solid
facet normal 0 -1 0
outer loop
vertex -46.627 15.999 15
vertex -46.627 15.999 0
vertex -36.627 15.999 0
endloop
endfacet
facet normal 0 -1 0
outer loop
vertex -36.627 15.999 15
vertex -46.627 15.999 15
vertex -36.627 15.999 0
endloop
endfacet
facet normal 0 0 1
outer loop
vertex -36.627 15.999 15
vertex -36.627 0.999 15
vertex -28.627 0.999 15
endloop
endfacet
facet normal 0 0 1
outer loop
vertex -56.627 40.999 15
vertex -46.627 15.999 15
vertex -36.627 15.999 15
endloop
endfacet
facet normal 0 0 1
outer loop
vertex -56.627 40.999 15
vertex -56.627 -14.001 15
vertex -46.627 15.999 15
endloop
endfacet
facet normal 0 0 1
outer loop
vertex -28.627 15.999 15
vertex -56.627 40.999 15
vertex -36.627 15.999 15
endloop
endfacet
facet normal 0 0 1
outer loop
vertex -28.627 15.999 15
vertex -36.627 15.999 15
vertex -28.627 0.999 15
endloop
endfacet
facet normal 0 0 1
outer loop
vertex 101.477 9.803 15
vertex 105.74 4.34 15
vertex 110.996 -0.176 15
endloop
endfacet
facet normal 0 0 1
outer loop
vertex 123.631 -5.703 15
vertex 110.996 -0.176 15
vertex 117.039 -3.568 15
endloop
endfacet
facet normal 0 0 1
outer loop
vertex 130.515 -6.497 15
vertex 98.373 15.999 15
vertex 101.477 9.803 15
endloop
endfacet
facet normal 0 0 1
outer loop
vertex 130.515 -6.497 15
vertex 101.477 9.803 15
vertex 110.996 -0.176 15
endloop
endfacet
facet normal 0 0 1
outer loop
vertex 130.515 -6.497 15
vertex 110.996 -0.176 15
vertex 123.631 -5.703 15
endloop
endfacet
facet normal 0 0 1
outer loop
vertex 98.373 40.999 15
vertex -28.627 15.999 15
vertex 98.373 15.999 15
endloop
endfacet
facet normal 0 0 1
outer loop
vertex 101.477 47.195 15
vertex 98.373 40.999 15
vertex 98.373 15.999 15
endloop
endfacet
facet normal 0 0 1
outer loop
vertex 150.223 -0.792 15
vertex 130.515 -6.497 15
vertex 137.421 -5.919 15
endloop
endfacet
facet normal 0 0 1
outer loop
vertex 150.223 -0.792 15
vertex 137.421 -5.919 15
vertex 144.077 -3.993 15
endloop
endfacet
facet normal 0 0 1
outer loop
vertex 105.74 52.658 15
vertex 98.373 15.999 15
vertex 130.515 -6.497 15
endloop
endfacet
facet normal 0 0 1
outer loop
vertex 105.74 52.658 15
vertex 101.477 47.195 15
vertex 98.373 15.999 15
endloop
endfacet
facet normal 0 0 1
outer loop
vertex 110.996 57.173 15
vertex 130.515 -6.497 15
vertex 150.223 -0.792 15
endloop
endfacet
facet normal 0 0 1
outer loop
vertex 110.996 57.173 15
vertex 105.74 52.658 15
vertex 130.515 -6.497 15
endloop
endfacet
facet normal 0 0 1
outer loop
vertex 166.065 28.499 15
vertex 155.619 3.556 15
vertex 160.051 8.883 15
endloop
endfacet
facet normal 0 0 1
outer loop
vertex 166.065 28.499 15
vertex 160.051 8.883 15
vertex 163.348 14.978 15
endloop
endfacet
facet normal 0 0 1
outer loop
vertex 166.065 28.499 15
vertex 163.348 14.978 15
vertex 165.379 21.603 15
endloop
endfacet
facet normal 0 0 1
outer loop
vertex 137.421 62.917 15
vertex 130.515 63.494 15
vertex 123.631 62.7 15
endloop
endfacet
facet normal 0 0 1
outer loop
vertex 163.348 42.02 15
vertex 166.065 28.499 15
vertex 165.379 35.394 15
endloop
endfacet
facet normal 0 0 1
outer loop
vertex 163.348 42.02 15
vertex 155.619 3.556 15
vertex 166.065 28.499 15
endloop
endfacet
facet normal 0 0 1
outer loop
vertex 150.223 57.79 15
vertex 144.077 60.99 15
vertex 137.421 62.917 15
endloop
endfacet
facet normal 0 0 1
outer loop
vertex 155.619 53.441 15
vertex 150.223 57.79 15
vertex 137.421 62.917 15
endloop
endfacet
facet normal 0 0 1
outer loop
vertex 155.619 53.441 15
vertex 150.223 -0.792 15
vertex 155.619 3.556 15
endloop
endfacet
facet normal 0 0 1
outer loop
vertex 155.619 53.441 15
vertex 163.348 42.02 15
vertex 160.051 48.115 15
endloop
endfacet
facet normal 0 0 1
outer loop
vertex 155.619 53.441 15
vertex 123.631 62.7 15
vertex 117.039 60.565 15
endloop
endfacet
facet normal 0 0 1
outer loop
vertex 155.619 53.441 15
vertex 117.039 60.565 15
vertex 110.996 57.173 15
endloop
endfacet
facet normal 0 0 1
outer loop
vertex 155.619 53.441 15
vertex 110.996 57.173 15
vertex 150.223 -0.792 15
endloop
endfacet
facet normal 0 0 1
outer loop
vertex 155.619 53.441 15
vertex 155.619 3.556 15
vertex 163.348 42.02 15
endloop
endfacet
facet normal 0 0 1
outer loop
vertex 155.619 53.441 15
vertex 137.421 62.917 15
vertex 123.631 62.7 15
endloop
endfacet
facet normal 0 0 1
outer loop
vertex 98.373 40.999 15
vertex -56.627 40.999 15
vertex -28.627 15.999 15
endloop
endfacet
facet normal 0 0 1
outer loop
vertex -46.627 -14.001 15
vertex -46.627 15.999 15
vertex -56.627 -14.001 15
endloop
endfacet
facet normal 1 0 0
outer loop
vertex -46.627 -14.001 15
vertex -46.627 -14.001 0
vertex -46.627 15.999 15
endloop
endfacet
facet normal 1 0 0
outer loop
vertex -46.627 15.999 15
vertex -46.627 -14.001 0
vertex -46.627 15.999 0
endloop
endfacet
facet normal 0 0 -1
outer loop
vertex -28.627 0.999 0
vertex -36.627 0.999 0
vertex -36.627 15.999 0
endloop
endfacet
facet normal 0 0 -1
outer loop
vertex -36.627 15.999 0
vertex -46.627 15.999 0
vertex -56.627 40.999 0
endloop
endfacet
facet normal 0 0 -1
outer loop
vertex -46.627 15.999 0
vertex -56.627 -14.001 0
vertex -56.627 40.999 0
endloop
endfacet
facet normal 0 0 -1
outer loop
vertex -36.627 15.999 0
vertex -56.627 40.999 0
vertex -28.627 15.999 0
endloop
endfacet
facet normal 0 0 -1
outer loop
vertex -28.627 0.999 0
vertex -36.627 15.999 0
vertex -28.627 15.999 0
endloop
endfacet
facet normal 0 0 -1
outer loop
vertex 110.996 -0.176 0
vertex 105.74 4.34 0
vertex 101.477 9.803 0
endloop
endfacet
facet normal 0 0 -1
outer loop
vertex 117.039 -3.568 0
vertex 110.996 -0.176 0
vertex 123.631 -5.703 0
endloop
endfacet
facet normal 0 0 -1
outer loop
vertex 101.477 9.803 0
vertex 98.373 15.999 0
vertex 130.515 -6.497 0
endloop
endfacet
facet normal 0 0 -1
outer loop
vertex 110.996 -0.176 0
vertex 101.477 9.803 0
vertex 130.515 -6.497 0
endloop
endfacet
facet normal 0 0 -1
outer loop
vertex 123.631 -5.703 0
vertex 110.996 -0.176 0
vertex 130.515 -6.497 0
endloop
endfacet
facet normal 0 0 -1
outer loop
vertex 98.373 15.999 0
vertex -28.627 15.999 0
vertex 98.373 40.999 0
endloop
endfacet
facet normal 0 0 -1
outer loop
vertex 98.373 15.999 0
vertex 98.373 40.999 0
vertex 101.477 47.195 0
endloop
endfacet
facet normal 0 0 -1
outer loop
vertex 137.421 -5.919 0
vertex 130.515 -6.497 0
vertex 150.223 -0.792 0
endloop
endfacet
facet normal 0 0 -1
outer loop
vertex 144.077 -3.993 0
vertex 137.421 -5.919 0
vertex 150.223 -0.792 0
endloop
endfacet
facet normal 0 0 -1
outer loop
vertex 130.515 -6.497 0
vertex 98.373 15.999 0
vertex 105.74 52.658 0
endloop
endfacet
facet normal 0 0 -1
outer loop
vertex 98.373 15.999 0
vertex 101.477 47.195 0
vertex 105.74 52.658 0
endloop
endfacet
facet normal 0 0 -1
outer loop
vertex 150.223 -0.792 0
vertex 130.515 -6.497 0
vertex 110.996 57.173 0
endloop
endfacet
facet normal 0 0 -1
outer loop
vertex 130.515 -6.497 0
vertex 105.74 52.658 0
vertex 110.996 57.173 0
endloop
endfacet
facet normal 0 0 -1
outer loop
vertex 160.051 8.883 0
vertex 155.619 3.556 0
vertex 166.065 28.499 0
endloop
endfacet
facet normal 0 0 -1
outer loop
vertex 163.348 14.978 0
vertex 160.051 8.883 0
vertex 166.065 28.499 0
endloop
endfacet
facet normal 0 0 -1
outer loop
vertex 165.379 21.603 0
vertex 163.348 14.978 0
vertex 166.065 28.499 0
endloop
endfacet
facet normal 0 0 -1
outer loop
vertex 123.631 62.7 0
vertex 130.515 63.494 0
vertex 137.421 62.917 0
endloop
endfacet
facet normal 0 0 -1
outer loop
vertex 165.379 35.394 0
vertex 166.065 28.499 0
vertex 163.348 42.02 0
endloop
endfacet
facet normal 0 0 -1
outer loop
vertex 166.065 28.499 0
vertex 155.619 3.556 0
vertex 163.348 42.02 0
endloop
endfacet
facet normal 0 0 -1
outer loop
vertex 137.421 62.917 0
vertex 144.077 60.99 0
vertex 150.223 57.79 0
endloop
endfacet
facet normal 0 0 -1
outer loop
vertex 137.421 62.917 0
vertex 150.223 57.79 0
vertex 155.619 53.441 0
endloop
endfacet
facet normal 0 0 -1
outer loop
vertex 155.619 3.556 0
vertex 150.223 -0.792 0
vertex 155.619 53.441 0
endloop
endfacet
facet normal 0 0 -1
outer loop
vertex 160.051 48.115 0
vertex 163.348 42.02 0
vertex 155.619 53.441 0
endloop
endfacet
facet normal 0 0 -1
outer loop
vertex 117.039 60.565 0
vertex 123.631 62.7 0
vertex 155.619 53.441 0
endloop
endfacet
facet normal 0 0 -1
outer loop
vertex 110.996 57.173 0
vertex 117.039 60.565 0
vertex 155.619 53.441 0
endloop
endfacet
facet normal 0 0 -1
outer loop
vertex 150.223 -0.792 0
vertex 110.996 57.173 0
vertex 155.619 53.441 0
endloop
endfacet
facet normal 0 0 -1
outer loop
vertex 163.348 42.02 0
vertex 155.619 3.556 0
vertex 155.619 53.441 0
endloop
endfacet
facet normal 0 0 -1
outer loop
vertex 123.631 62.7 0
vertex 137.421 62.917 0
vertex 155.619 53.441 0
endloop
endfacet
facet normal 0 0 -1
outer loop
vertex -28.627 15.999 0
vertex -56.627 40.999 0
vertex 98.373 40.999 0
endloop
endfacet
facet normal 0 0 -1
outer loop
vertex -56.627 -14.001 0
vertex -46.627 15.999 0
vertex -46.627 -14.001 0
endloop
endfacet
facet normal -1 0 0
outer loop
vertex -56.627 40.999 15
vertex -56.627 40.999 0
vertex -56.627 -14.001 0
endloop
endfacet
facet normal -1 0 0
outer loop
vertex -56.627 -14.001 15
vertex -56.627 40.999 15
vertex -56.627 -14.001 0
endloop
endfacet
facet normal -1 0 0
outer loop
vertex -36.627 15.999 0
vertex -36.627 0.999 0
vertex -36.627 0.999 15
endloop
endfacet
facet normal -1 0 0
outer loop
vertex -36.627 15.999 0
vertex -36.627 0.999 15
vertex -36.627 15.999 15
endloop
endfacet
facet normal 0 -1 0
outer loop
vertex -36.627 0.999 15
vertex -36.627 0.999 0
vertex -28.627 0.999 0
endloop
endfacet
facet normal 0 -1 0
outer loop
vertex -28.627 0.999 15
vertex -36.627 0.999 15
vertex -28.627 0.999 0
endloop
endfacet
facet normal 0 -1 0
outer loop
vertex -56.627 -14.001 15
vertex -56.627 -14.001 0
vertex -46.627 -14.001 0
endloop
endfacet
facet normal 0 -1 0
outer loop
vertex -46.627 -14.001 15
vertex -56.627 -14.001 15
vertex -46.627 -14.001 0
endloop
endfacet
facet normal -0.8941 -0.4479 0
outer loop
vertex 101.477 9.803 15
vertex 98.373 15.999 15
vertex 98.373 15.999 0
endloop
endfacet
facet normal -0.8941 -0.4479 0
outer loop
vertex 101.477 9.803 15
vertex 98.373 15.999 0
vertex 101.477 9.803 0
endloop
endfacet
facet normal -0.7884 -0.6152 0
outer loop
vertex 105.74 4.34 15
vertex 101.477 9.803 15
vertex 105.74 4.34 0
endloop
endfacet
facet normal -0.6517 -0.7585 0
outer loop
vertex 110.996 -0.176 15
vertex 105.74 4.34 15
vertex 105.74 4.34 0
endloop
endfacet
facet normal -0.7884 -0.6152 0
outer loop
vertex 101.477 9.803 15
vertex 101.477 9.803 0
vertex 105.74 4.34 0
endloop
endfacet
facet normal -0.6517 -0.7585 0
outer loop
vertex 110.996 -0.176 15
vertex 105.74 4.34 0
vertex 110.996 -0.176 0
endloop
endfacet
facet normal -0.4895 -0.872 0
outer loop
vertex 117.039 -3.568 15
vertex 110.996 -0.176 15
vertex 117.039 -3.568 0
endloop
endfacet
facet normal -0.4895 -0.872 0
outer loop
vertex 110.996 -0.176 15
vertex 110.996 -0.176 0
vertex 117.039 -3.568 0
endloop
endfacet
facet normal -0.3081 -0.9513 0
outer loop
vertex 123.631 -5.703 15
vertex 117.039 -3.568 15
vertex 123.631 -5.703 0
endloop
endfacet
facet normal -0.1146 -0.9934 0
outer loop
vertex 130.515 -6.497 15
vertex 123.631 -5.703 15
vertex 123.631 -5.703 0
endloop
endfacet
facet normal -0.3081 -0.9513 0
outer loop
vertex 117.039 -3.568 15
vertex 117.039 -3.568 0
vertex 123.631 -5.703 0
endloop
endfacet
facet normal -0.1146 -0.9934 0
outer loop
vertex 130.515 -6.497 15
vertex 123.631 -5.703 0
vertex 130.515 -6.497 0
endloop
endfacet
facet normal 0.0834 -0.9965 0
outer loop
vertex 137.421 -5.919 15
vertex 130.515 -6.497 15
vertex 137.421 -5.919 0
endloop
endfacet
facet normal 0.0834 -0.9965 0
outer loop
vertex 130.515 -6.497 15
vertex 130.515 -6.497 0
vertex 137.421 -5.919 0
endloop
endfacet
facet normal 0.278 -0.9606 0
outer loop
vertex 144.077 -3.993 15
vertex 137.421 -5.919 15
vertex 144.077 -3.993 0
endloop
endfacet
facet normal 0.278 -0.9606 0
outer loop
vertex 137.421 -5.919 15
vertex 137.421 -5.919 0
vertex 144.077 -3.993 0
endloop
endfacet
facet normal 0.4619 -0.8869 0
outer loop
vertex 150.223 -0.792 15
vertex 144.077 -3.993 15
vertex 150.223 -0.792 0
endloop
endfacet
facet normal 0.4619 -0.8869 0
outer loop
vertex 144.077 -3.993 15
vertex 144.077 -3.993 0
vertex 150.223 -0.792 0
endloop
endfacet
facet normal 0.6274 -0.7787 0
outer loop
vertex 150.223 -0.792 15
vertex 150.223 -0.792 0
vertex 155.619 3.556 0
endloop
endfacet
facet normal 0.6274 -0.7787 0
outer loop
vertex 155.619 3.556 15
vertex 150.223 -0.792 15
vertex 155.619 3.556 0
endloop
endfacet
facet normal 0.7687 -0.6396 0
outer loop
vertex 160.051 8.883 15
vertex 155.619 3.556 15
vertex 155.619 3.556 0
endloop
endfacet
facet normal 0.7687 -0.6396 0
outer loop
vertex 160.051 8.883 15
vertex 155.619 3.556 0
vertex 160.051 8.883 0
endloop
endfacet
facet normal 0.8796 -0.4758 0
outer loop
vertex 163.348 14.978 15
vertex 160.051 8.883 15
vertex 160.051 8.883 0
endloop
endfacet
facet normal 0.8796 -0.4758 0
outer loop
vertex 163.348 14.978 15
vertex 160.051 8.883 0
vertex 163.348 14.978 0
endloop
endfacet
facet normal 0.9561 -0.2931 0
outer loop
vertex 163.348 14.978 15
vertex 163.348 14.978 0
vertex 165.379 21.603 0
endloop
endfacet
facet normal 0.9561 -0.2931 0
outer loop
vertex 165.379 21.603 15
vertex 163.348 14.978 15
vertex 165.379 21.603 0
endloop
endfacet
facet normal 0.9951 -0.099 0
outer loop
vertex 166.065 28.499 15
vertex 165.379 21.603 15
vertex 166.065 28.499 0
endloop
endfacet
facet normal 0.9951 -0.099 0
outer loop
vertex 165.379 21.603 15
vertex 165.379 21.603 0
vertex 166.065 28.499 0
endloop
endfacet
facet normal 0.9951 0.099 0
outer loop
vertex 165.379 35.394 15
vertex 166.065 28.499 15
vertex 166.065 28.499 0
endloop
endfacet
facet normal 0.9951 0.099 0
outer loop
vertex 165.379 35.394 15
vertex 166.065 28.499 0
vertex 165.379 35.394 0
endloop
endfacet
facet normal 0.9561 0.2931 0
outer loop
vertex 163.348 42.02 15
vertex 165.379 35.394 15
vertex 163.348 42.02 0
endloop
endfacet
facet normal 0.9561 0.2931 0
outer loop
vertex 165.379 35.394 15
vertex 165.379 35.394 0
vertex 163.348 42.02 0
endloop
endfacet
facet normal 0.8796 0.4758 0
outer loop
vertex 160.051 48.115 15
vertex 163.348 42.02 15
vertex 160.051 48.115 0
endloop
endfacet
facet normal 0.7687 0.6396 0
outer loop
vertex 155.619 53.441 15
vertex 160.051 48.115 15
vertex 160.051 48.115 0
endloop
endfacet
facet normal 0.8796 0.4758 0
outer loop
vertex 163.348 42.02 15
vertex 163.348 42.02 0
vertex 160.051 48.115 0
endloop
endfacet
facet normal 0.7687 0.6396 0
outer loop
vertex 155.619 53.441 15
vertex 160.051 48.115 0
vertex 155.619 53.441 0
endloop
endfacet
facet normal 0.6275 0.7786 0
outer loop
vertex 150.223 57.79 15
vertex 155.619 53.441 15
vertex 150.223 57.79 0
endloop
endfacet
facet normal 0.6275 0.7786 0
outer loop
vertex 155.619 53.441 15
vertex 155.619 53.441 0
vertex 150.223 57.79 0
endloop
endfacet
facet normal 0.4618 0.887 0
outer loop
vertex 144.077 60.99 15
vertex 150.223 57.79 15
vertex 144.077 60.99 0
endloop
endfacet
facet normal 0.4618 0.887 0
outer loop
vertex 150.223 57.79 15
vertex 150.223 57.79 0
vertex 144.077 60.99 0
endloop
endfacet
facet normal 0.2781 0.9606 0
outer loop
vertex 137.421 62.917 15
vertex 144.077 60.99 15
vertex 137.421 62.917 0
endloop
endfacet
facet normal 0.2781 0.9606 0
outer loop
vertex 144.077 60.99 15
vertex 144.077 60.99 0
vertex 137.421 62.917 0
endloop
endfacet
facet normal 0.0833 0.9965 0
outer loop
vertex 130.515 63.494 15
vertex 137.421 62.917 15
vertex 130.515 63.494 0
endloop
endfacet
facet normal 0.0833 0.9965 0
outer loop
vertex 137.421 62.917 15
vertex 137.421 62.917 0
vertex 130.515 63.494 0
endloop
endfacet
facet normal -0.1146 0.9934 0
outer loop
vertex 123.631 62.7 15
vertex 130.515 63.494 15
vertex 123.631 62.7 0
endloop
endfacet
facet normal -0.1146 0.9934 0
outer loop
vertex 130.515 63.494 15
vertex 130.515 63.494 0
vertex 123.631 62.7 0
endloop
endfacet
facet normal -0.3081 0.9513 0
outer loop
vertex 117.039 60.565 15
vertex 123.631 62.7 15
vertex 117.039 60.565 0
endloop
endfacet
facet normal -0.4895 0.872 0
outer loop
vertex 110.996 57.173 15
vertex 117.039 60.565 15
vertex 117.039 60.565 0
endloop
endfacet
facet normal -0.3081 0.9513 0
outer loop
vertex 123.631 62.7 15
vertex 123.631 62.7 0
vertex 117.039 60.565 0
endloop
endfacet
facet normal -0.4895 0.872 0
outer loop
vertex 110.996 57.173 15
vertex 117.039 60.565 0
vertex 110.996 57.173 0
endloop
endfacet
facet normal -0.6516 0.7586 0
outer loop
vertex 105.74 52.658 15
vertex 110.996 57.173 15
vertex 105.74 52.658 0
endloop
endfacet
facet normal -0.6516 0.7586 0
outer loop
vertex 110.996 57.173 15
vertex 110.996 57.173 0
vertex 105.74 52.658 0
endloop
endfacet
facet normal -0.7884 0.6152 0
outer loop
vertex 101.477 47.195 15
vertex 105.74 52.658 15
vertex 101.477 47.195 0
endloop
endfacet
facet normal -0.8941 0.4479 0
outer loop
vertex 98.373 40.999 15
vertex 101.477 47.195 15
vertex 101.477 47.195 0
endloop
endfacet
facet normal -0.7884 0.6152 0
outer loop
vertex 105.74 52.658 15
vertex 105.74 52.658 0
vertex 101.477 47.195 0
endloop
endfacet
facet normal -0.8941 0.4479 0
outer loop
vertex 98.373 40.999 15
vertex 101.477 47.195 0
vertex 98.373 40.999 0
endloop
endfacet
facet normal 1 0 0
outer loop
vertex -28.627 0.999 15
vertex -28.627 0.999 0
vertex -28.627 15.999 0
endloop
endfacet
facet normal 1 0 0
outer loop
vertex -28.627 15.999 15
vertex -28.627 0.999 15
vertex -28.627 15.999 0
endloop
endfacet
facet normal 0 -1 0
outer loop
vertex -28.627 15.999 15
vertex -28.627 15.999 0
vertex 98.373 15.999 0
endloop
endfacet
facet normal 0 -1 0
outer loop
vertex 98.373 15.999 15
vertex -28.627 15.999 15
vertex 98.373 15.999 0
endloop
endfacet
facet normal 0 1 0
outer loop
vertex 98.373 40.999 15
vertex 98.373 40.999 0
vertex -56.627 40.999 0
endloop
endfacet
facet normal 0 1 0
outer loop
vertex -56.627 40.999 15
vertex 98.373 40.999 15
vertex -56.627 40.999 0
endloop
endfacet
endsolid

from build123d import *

# Parameters (mm, degrees)
F0_R     = 17.5
F0_W     = 10
F0_H     = 30
F0_W_2   = 8
F0_H_2   = 15
F1_DEPTH = 15


with BuildPart() as f1:
    # F0 (on Top) → F1 (new body)
    with BuildSketch(Plane.XY):
        Polygon((98.3732019503, 40.9987986088), (-56.6267980497, 40.9987986088), (-56.6267980497, 15.9987986088), (-46.6267980497, 15.9987986088), (-36.6267980497, 15.9987986088), (-28.6267980497, 15.9987986088), (-18.6267980497, 15.9987986088), (-11.6267980497, 15.9987986088), (-4.6267980497, 15.9987986088), (98.3732019503, 15.9987986088), align=None)
        with BuildLine():
            ThreePointArc((98.3732019503, 15.9987986088), (166.0649440268, 28.4987986088), (98.3732019503, 40.9987986088))
            Line((98.3732019503, 40.9987986088), (98.3732019503, 15.9987986088))
        make_face()
        with Locations((131.0649440268, 28.4987986088)):
            Circle(F0_R, mode=Mode.SUBTRACT)
        with Locations((131.0649440268, 28.4987986088)):
            Circle(F0_R)
        with Locations((-51.6267980497, 0.9987986088)):
            Rectangle(F0_W, F0_H)
        with Locations((-32.6267980497, 8.4987986088)):
            Rectangle(F0_W_2, F0_H_2)
    extrude(amount=F1_DEPTH)


solid = f1.part
